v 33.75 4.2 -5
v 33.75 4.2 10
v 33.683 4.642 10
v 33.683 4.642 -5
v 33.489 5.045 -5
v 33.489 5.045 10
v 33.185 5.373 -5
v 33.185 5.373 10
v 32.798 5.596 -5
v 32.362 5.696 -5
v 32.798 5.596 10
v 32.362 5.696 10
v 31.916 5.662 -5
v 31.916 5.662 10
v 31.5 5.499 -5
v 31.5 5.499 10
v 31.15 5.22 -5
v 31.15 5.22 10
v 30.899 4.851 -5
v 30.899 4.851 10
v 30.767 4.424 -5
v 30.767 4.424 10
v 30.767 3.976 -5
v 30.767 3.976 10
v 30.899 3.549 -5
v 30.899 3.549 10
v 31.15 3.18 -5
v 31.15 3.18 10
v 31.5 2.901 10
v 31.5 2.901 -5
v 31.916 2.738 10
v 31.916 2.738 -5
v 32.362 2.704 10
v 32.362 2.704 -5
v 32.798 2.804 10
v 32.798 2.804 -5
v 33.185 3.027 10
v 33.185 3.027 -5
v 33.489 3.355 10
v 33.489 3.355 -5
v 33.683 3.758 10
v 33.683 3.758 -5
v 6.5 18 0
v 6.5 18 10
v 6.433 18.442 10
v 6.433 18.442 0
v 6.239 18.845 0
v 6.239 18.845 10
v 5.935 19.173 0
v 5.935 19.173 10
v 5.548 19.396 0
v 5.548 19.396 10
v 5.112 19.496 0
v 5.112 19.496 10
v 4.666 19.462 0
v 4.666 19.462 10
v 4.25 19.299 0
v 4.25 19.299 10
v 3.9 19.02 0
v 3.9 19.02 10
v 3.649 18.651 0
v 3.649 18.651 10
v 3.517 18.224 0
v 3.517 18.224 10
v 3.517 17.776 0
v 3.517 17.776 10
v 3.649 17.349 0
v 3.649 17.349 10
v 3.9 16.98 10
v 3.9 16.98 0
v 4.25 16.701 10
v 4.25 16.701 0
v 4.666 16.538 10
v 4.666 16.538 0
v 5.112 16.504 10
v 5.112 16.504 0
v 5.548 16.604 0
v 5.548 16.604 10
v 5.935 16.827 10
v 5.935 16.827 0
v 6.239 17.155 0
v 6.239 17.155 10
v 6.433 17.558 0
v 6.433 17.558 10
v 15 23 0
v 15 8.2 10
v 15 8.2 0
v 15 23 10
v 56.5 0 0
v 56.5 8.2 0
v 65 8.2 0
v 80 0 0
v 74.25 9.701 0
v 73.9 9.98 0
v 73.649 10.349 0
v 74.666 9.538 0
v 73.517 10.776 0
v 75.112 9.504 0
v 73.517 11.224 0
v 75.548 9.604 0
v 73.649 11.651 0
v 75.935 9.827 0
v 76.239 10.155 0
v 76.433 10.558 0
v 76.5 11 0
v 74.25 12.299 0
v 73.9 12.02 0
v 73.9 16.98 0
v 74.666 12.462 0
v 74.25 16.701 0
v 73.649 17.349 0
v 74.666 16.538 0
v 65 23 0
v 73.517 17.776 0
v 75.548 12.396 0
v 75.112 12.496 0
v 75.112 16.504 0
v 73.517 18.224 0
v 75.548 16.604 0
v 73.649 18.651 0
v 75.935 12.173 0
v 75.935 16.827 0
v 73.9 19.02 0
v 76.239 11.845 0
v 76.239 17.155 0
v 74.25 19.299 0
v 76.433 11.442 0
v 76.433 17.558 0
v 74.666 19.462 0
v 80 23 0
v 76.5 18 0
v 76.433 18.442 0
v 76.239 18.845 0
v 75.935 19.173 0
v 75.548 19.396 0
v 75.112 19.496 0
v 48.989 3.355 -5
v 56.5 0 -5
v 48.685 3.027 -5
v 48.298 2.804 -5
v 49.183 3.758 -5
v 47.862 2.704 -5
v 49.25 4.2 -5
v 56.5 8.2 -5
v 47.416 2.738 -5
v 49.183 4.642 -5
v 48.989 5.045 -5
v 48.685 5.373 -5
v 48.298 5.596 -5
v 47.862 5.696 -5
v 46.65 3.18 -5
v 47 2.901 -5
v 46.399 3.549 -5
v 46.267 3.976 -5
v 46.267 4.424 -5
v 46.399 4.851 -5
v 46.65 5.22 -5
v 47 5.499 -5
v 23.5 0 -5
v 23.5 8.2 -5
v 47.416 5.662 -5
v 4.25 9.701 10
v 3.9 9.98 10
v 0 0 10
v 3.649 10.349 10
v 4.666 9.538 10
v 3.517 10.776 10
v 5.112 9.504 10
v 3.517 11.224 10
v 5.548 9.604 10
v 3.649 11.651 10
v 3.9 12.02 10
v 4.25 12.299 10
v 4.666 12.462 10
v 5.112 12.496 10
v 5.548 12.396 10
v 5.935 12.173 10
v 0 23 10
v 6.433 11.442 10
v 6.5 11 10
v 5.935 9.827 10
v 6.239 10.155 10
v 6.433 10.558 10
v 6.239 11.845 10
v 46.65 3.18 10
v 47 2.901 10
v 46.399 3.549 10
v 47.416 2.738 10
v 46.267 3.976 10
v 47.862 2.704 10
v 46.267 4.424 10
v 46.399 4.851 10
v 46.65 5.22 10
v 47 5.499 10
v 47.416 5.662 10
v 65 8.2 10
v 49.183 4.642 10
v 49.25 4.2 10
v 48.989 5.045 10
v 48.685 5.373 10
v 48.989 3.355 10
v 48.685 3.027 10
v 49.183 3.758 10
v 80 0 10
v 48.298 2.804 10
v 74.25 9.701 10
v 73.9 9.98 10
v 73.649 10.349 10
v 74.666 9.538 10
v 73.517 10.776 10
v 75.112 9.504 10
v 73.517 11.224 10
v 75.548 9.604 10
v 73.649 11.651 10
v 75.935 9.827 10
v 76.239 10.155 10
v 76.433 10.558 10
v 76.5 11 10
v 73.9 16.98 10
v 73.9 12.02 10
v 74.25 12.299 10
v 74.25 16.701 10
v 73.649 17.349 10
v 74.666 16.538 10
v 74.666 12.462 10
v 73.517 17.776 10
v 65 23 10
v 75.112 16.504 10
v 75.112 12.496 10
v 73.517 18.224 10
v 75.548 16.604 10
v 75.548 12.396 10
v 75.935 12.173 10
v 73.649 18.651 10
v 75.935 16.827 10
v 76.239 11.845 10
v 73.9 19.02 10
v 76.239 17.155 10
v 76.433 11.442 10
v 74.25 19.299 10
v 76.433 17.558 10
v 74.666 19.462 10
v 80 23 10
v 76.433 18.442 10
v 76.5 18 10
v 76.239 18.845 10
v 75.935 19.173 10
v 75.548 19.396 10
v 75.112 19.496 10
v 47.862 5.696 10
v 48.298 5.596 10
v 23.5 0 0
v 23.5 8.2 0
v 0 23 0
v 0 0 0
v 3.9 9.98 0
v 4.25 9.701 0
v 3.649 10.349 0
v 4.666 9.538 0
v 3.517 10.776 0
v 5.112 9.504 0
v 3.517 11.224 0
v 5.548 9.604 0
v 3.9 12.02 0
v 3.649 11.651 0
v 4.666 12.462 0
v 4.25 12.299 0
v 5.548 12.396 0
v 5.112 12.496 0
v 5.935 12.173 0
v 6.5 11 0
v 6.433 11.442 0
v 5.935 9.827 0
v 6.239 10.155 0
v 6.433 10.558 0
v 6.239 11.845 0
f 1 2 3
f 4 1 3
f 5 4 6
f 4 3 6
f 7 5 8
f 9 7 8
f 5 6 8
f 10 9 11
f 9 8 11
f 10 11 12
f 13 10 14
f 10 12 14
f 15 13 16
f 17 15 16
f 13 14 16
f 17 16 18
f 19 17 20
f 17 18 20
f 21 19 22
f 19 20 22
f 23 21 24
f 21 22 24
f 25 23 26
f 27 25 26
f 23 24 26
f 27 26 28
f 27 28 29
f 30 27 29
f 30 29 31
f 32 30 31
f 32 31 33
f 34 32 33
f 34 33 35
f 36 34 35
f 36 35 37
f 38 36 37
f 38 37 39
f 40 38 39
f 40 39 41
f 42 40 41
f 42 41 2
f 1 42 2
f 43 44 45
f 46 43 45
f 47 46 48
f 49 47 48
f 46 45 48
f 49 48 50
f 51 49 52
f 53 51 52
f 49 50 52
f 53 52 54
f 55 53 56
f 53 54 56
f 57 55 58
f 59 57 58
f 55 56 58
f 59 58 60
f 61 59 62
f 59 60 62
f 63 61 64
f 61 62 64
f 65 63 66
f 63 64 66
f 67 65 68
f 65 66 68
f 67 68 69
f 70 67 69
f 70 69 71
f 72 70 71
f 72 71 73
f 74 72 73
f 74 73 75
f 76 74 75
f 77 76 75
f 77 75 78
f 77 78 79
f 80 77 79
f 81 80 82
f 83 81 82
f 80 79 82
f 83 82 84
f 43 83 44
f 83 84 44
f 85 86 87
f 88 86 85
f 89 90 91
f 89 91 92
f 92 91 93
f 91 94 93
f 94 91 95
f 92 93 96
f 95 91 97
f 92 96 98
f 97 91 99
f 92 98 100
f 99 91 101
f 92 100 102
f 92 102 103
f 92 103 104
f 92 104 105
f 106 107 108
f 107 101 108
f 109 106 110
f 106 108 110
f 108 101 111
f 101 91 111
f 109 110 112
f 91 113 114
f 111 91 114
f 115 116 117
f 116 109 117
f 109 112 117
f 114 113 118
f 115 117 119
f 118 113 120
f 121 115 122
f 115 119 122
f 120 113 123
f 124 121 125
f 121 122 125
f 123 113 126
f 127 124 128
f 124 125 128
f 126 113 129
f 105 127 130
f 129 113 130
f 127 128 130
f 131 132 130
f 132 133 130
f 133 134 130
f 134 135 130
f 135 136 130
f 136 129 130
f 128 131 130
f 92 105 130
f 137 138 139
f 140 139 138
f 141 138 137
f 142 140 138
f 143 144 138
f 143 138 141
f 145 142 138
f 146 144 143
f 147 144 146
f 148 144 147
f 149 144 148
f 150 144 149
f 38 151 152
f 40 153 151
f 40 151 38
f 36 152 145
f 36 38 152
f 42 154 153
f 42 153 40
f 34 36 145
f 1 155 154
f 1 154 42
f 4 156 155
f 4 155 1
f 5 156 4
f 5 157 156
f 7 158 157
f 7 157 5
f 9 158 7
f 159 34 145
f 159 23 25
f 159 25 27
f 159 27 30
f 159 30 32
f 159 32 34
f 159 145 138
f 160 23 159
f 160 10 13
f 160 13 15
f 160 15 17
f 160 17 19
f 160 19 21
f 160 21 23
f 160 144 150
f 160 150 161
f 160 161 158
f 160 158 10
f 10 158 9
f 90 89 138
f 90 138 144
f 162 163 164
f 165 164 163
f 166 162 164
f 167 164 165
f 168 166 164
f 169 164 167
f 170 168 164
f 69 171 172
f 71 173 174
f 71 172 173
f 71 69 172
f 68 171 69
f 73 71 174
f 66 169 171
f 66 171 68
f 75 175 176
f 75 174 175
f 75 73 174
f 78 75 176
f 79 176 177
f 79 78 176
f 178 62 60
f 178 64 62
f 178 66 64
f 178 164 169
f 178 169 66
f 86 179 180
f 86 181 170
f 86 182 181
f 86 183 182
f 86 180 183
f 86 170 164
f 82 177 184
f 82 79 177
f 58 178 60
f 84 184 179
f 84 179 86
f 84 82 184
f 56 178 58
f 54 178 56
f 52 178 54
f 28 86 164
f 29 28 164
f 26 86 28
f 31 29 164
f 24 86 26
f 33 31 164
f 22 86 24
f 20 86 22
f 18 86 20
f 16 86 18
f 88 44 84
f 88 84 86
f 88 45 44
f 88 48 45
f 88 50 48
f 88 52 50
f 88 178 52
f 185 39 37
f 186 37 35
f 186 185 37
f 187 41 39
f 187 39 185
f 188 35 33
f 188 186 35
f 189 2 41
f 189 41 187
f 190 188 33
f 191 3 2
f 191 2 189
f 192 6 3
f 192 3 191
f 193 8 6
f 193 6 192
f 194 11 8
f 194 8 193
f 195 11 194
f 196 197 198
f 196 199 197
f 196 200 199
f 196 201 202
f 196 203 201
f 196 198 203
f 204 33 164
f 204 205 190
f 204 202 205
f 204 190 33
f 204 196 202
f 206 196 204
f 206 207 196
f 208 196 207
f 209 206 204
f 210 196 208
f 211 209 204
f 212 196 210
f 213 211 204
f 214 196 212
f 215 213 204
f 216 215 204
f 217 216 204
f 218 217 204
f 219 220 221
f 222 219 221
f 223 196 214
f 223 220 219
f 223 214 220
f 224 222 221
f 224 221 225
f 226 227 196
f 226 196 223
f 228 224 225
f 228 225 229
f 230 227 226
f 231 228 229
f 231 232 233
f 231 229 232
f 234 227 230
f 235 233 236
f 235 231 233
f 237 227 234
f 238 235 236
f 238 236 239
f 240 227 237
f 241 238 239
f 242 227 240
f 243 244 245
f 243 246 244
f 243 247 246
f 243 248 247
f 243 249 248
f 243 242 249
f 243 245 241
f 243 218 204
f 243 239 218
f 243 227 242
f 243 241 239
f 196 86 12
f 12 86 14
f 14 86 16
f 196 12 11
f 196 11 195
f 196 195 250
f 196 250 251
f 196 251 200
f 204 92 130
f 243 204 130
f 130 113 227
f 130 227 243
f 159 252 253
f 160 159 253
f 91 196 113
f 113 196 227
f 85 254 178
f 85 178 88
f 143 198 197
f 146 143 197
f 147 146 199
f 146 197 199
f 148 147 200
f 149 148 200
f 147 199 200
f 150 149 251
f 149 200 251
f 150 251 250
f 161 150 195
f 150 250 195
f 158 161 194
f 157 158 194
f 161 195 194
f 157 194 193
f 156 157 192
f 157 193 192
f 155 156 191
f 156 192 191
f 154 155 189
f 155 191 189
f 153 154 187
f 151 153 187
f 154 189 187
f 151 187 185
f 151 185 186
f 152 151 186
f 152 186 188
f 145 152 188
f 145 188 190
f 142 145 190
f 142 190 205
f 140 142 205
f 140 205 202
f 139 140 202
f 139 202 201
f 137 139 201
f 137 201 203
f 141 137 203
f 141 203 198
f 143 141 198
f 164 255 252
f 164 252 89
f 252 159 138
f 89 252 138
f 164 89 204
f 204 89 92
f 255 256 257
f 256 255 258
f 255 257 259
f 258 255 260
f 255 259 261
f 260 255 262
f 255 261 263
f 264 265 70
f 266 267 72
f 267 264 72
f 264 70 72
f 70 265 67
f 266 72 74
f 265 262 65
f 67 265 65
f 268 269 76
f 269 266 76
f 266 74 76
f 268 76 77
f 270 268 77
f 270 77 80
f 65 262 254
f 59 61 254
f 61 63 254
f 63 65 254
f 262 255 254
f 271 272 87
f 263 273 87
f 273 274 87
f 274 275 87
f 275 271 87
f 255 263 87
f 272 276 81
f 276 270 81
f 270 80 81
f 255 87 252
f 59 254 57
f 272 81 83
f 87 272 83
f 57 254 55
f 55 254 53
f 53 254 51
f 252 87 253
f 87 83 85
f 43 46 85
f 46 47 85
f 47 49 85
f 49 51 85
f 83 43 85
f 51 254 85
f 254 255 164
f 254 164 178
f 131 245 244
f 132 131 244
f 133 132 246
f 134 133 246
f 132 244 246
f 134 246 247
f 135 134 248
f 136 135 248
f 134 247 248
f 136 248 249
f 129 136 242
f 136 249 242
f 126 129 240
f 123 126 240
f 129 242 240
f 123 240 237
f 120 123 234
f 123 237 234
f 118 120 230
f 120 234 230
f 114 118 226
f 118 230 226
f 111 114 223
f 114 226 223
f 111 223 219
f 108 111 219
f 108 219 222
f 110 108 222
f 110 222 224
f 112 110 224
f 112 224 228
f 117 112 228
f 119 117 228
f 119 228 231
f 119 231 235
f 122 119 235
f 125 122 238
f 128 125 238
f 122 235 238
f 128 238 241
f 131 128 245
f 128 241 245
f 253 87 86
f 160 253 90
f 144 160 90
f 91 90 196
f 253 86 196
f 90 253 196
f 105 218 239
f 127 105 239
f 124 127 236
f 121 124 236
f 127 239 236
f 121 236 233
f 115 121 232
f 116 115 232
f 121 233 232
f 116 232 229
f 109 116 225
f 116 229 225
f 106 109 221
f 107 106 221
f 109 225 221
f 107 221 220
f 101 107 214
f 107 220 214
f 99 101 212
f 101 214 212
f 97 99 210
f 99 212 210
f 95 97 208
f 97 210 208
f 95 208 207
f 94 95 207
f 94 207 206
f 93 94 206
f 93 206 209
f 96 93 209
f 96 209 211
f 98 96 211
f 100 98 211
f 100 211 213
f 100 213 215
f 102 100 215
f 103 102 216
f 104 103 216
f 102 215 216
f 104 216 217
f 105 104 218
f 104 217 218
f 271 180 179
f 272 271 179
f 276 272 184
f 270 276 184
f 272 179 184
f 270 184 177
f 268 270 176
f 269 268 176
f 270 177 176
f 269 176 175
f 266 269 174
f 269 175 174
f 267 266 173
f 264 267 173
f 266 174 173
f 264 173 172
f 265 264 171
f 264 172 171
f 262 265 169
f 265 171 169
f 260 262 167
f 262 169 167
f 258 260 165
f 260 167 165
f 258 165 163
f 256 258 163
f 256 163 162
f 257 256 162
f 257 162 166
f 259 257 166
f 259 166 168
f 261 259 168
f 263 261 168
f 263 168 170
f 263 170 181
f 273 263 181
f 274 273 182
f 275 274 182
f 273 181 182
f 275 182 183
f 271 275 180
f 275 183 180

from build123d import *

# Parameters (mm, degrees)
SKETCH1_W           = 80
SKETCH1_H           = 23
BOSS_EXTRUDE3_DEPTH = 10
SKETCH4_W           = 50
SKETCH4_H           = 14.8
CUT_EXTRUDE1_DEPTH  = 10
SKETCH6_R           = 1.5
CUT_EXTRUDE5_DEPTH  = 10
SKETCH7_W           = 33
SKETCH7_H           = 8.2
BOSS_EXTRUDE4_DEPTH = 5
SKETCH5_R           = 1.5
CUT_EXTRUDE2_DEPTH  = 19


with BuildPart() as part:
    # Sketch1 → Boss-Extrude3 (new body)
    with BuildSketch(Plane.XY):
        with Locations((40, 11.5)):
            Rectangle(SKETCH1_W, SKETCH1_H)
    extrude(amount=BOSS_EXTRUDE3_DEPTH)

    # Sketch4 → Cut-Extrude1 (cut)
    with BuildSketch(Plane.XY.offset(10)):
        with Locations((40, 15.6)):
            Rectangle(SKETCH4_W, SKETCH4_H)
    extrude(amount=-CUT_EXTRUDE1_DEPTH, mode=Mode.SUBTRACT)

    # Sketch6 → Cut-Extrude5 (cut)
    with BuildSketch(Plane.XY.offset(10)):
        with Locations((5, 18)):
            Circle(SKETCH6_R)
        with Locations((5, 11)):
            Circle(SKETCH6_R)
        with Locations((75, 11)):
            Circle(SKETCH6_R)
        with Locations((75, 18)):
            Circle(SKETCH6_R)
    extrude(amount=-CUT_EXTRUDE5_DEPTH, mode=Mode.SUBTRACT)

    # Sketch7 → Boss-Extrude4 (add)
    with BuildSketch(Plane(origin=(0, 0, 0), x_dir=(-1, 0, 0), z_dir=(0, 0, -1))):
        with Locations((-40, 4.1)):
            Rectangle(SKETCH7_W, SKETCH7_H)
    extrude(amount=BOSS_EXTRUDE4_DEPTH)

    # Sketch5 → Cut-Extrude2 (cut)
    with BuildSketch(Plane.XY.offset(10)):
        with Locations((32.25, 4.2)):
            Circle(SKETCH5_R)
        with Locations((47.75, 4.2)):
            Circle(SKETCH5_R)
    extrude(amount=-CUT_EXTRUDE2_DEPTH, mode=Mode.SUBTRACT)


solid = part.part
